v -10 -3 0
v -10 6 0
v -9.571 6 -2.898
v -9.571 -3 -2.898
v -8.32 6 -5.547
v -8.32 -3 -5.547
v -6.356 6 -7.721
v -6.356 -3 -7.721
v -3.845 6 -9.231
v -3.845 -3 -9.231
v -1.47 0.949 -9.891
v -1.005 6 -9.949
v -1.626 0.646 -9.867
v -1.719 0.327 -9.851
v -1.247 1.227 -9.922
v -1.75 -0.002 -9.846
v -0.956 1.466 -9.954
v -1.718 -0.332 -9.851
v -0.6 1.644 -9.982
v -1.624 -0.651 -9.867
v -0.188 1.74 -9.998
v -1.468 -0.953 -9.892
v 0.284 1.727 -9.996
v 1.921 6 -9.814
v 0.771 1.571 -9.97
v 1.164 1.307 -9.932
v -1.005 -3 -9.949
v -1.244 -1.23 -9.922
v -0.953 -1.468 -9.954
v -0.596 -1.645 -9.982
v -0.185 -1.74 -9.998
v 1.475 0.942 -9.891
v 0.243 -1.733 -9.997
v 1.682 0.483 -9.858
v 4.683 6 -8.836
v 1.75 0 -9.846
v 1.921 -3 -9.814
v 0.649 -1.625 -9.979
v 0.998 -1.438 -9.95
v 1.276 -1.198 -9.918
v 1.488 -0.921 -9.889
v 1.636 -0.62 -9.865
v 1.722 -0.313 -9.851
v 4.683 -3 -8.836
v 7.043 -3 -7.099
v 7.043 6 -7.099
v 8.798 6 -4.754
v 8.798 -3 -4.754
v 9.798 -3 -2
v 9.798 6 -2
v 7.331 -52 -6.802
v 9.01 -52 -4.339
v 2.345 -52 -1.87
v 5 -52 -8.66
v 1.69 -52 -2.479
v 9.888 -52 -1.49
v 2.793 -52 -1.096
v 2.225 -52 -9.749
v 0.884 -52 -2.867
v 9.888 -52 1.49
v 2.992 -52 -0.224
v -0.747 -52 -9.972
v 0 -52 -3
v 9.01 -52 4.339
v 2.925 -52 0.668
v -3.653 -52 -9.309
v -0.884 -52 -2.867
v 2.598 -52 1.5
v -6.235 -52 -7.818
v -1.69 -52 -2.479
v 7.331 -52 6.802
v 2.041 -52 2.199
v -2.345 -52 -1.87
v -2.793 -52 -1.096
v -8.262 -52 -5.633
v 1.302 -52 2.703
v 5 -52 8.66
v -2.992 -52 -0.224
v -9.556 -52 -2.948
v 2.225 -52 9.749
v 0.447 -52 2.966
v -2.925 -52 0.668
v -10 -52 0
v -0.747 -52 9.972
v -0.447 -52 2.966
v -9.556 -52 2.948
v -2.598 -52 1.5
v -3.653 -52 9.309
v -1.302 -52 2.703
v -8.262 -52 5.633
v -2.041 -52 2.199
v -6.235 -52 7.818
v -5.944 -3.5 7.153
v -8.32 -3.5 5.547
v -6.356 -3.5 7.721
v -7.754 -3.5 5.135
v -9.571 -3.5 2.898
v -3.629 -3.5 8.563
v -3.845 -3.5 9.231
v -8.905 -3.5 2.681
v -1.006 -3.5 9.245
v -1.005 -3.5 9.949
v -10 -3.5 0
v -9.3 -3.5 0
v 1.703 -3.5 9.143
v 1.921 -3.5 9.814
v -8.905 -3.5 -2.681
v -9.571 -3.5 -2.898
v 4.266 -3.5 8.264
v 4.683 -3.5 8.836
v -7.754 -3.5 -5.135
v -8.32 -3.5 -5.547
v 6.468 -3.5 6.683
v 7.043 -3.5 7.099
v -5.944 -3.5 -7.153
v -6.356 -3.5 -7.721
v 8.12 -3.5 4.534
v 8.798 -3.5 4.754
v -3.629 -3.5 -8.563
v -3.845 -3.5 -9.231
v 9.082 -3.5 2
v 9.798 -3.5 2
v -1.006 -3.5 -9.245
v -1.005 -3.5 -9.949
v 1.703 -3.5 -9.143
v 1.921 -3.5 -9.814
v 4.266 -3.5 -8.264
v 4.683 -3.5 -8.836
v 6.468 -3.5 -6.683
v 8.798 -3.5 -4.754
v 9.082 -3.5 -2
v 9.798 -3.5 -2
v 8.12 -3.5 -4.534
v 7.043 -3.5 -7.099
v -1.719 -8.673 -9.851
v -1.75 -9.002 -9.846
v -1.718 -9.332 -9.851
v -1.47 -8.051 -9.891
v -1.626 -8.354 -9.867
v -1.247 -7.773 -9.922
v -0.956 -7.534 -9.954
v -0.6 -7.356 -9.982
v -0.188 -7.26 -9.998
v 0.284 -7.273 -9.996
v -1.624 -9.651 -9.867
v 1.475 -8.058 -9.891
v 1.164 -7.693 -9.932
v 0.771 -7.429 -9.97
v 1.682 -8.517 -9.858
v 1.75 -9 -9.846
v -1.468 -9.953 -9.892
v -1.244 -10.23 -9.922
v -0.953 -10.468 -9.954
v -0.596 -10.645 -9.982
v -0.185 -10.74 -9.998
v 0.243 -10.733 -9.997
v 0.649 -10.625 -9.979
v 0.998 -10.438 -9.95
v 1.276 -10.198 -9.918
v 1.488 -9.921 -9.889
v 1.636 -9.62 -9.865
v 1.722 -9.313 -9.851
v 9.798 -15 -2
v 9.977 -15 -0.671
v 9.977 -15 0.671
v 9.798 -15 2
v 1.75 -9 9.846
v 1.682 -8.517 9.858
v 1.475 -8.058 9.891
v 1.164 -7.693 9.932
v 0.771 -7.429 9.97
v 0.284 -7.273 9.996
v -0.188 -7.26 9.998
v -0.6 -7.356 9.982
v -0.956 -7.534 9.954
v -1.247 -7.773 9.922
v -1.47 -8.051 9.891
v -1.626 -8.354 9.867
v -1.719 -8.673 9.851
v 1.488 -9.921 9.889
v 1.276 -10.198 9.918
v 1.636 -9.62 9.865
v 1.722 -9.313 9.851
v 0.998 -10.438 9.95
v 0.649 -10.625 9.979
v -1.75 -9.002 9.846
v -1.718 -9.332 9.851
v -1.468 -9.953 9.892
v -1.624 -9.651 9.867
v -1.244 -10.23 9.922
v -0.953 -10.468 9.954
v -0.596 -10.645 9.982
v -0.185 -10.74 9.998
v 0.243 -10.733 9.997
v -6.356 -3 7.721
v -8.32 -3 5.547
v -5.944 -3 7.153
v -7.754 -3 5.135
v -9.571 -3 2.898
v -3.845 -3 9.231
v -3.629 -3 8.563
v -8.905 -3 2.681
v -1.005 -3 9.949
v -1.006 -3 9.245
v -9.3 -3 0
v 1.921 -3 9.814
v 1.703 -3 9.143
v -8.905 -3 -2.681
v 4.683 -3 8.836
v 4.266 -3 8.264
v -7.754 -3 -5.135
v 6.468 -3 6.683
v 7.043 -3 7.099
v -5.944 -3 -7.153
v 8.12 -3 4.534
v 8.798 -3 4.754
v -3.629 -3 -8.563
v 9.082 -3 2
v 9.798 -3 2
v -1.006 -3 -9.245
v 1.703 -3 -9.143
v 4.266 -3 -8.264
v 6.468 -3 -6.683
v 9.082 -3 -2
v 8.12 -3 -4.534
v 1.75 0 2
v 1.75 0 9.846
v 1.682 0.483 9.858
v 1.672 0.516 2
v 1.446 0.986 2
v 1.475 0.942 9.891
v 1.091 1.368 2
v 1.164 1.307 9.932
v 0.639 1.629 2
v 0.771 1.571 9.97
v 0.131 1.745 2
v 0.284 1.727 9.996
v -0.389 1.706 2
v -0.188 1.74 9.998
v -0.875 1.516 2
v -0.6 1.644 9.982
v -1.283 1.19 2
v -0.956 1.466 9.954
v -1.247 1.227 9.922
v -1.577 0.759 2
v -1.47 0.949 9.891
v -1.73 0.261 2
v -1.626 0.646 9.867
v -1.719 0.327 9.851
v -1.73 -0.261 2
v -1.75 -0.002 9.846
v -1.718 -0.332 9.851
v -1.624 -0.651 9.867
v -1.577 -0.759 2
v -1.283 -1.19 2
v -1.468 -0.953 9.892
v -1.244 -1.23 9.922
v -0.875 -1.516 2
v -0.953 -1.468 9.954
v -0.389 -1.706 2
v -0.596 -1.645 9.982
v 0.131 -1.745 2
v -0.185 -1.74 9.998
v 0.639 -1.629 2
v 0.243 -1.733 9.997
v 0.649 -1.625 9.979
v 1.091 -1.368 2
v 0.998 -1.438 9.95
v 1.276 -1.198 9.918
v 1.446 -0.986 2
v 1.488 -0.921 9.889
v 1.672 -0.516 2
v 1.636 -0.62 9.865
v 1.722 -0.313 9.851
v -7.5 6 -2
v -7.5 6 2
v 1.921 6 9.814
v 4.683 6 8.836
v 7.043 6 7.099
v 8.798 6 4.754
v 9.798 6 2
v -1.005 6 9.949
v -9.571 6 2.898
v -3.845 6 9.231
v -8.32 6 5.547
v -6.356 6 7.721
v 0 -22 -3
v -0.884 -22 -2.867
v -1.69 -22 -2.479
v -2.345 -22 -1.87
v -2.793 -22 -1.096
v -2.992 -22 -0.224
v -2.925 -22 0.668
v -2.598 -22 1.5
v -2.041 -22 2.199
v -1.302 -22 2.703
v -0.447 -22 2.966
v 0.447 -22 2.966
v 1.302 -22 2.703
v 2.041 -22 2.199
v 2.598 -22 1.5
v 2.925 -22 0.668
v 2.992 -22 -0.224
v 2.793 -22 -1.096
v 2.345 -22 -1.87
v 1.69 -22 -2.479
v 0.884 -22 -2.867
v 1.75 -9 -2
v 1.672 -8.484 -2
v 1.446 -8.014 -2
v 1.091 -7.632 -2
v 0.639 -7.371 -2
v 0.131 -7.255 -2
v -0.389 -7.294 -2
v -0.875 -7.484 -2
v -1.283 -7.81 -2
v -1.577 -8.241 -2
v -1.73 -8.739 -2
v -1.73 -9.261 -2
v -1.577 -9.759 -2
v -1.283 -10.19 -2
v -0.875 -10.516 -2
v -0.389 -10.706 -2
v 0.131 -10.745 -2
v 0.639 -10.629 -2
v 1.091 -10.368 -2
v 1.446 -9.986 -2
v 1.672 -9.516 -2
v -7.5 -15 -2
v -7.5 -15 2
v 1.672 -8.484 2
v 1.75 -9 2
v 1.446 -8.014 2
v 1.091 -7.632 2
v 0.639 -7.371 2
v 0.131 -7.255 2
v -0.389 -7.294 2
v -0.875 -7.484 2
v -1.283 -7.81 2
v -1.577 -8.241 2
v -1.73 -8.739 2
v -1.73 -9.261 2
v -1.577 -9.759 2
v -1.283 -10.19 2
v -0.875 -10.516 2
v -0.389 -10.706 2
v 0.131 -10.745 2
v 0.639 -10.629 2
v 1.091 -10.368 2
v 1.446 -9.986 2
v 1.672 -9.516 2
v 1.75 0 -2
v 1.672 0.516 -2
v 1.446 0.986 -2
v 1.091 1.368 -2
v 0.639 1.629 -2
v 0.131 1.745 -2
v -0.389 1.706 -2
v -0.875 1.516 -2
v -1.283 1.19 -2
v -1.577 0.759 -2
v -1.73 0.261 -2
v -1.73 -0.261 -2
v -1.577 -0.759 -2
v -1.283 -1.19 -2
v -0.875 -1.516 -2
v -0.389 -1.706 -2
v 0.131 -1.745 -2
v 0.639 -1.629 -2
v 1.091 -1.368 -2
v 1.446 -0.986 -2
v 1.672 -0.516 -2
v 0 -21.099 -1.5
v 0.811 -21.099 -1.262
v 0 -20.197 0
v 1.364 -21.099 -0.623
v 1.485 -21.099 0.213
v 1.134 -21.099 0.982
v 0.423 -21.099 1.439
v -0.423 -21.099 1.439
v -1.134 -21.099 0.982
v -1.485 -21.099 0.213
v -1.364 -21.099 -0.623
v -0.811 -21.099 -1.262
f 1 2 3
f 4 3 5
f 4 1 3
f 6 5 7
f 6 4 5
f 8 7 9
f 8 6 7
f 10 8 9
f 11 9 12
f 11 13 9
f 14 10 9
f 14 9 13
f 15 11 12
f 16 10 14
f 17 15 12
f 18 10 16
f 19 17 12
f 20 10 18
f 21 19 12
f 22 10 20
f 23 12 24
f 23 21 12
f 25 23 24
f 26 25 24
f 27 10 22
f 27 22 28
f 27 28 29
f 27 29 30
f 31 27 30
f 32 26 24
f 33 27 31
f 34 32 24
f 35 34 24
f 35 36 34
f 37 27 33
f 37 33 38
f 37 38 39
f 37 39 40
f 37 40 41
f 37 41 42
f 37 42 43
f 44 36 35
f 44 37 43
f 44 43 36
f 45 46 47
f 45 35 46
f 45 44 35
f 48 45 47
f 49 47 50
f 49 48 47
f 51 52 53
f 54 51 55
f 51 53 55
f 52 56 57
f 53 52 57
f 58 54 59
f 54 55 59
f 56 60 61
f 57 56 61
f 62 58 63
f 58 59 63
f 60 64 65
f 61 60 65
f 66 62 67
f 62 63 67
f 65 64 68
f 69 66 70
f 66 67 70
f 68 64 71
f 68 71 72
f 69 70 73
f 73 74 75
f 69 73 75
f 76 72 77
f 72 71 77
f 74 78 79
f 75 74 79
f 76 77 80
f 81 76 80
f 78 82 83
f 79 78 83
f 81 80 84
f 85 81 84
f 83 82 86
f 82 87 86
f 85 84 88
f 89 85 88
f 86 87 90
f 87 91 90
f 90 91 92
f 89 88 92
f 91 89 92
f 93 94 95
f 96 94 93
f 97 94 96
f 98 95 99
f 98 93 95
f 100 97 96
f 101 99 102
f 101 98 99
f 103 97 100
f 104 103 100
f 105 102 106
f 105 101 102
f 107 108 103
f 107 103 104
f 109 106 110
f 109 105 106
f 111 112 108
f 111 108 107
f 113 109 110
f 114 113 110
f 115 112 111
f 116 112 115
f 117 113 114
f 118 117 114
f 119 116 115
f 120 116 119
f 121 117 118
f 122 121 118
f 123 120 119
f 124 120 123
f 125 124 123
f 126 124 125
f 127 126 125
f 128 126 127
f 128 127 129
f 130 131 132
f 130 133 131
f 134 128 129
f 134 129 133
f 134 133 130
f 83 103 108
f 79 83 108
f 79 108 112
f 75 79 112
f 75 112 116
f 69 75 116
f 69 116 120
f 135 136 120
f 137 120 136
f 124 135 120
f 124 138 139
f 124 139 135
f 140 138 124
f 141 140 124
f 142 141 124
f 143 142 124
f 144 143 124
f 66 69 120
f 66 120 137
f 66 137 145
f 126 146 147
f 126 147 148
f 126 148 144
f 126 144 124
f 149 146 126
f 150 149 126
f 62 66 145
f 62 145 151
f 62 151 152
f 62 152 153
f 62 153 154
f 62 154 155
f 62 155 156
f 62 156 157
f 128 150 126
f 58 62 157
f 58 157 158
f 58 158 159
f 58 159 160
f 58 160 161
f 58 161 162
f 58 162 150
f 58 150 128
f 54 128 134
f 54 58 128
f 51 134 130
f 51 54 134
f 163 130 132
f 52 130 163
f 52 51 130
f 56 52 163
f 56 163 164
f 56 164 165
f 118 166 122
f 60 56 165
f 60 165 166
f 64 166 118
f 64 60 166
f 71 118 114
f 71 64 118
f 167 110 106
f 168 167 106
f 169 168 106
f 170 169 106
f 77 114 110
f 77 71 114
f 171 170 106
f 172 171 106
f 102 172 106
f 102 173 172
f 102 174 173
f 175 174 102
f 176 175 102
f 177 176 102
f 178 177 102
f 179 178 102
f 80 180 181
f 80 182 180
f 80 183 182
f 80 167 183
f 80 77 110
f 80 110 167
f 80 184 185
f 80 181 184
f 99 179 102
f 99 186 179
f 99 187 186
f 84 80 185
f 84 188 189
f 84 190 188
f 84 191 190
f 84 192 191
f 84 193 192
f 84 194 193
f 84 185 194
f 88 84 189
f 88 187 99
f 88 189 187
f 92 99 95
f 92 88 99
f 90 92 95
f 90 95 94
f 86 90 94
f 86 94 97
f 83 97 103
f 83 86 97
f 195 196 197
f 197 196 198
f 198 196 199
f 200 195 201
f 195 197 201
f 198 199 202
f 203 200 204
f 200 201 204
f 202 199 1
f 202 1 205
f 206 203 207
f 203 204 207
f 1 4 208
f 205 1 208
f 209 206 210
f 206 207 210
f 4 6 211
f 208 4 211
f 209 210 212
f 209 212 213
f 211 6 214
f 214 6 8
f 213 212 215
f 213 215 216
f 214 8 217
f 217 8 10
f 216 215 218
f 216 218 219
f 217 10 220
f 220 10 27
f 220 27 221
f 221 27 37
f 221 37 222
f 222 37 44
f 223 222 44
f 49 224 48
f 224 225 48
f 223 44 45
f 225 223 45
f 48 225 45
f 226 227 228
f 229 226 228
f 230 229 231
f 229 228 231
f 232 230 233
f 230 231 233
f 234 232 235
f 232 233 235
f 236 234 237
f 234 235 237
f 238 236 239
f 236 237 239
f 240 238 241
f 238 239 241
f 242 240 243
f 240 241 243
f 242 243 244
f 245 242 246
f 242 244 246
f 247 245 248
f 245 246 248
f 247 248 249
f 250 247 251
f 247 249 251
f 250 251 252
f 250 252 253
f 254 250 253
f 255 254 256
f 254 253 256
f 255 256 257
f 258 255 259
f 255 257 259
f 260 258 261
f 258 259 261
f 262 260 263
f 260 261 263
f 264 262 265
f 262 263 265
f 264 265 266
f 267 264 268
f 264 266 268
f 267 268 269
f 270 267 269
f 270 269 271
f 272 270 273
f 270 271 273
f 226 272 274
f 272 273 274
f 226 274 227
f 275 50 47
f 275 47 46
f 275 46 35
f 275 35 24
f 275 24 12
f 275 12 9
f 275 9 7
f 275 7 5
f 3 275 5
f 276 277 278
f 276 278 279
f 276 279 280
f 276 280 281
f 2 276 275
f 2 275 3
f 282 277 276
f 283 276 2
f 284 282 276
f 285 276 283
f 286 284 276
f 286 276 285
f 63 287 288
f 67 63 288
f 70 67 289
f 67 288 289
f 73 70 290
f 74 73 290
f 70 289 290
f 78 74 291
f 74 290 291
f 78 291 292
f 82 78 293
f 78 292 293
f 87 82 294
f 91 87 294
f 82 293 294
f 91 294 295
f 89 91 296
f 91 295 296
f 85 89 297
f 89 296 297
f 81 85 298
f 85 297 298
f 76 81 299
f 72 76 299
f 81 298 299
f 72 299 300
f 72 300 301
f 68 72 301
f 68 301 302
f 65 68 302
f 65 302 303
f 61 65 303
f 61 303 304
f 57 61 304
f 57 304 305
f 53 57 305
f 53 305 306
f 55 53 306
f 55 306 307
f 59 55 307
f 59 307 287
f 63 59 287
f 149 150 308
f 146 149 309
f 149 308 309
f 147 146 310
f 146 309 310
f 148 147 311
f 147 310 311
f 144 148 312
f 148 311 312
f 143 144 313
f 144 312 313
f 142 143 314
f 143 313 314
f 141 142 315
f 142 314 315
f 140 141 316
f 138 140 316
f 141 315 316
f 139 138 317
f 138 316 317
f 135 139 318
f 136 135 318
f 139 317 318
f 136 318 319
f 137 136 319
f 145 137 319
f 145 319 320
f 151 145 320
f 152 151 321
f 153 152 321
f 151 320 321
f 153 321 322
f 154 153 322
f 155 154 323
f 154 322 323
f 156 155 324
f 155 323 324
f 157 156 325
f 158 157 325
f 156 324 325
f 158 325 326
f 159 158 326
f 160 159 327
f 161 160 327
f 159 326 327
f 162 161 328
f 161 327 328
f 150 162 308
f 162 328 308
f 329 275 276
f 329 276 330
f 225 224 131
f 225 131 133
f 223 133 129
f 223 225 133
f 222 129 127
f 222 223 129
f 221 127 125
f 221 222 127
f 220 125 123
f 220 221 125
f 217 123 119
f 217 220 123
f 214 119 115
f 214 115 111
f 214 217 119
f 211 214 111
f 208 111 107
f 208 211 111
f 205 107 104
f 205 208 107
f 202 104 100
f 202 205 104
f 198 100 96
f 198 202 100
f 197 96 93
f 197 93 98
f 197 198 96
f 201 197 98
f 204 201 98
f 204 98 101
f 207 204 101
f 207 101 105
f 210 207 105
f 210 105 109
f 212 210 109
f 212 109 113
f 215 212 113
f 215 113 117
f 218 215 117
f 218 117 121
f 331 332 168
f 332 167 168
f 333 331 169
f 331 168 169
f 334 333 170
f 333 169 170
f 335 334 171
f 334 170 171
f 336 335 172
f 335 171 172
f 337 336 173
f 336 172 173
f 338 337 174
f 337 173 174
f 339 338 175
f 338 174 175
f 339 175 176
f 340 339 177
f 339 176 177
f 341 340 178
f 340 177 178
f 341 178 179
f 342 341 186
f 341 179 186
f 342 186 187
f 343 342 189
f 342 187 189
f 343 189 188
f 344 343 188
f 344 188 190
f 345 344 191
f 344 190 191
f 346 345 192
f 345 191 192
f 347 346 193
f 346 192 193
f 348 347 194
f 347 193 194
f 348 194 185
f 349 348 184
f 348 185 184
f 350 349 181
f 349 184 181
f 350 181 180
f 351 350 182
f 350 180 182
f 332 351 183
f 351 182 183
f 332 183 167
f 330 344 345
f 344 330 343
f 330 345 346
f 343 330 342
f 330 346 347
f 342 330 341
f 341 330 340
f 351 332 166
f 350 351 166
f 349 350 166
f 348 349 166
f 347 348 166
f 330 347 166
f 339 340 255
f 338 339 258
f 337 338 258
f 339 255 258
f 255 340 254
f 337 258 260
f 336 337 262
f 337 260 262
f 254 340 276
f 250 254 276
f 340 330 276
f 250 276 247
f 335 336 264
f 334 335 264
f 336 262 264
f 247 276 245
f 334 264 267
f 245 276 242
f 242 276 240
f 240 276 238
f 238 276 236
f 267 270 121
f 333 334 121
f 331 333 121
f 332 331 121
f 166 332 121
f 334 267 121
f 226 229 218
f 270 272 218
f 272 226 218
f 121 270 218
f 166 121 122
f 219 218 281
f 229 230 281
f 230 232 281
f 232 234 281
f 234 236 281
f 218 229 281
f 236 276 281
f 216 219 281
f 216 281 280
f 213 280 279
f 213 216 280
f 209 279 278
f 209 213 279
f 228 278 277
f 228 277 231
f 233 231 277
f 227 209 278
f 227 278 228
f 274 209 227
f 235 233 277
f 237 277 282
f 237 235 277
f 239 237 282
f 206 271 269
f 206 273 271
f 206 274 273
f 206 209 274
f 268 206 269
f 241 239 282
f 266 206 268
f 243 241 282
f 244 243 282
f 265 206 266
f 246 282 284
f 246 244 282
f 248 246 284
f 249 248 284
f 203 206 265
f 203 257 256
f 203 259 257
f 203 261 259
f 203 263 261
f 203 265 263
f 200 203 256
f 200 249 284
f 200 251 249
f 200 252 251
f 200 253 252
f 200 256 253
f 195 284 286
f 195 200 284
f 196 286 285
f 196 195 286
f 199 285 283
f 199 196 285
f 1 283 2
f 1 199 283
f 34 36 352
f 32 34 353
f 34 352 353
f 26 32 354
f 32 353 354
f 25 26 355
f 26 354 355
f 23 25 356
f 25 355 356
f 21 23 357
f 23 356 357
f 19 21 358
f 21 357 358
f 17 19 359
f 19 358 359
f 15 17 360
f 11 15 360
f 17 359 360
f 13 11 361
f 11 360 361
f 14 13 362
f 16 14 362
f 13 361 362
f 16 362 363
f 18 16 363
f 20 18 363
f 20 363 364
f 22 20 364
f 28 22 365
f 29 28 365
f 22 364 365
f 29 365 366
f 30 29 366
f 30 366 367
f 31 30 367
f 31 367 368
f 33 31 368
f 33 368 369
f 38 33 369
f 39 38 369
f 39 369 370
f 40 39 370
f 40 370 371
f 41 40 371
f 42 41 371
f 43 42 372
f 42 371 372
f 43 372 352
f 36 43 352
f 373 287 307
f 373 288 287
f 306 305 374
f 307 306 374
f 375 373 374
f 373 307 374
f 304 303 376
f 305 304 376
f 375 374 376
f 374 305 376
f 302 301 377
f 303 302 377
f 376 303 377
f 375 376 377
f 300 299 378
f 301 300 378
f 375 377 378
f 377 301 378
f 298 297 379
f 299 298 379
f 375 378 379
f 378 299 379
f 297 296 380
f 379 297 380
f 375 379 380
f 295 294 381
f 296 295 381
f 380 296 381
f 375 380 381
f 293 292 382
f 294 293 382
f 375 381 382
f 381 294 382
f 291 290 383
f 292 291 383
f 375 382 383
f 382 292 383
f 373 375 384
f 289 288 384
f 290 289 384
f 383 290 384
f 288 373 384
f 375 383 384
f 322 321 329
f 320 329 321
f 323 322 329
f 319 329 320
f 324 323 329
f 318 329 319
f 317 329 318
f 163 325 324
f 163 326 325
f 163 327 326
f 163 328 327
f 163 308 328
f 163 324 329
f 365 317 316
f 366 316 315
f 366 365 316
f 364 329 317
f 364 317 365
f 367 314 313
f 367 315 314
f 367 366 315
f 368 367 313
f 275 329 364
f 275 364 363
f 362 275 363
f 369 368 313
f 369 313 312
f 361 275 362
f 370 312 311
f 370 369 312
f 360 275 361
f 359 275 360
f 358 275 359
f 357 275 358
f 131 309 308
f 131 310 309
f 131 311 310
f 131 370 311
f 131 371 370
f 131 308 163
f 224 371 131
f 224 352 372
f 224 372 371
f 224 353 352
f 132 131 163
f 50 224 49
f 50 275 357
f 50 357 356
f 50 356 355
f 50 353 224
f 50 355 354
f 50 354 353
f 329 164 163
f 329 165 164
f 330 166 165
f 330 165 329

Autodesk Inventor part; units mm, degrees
ref_plane "YZ Plane" through (0, 0, 0) normal (1, 0, 0) x (0, 1, 0)
ref_plane "XZ Plane" through (0, 0, 0) normal (0, 1, 0) x (-1, 0, 0)
sketch "Body" plane through (0, 0, 0) normal (0, 0, 1) x (1, 0, 0)
  circle A0 centre (0, 0) radius 1.75
  line L0 (-10, -52) -> (10, -52)
  line L1 (10, 6) -> (-10, 6)
  line L2 (10, 6) -> (10, -52)
  line L3 (-10, 6) -> (-10, -52)
  line L4 (0, -52) -> (0, 6)
  line L5 (10, -15) -> (-10, -15)
  circle A1 centre (0, -9) radius 1.75
  circle A2 centre (0, 0) radius 2.75 construction
  circle A3 centre (0, -9) radius 2.75 construction
  line L6 (-7.5, 6) -> (-7.5, -15)
  dimension "d0" = 58
  dimension "d2" = 3.5
  dimension "d3" = 6
  dimension "d5" = 10
  dimension "d6" = 20
  dimension "d7" = 9
  dimension "d23" = 5.5
  dimension "d25" = 6
  dimension "d26" = 2.5
revolve "BodyFeature" add sketch "Body" angle 360 about axis through (0, -52, 0) along (0, 1, 0) picked at (-0.4801, -0.3314) picked at (-0.4801, -8.6686) contours L4 A0 | A0 L4 A1 L5 L6 L1 | L4 A1 | L6 L5 L3 L1 | L5 L4 L0 L3
extrude "HolesFeature" cut sketch "Body" along normal through all both and the other way through all contours A0 L4 | L4 A0 | A1 L4 | L4 A1
extrude "MountFeature" cut sketch "Body" along normal mid plane 4 contours A0 L4 L1 L2 L5 A1 | A0 L4 A1 L5 L6 L1
ref_plane "TopGroovePlane" through (-7.5, -3, -2) normal (0, 1, 0) x (1, 0, 0)
sketch "TopGroove" plane through (-7.5, -3, -2) normal (0, 1, 0) x (1, 0, 0)
  circle A0 centre (7.5, -2) radius 10 projected
  circle A1 centre (7.5, -2) radius 9.3
  dimension "d30" = 0.7
extrude "TopGrooveFeature" cut sketch "TopGroove" against normal blind 0.5
sketch "BottomMountHole" plane through (0, -52, 0) normal (0, -1, 0) x (1, 0, 0)
  circle A0 centre (0, 0) radius 10 projected
hole "BottomMountHoleFeature" at (0, -52, 0) direction (0, 1, 0) diameter 6 depth 30 tip angle 118
properties part number "PelvisMountStem"
